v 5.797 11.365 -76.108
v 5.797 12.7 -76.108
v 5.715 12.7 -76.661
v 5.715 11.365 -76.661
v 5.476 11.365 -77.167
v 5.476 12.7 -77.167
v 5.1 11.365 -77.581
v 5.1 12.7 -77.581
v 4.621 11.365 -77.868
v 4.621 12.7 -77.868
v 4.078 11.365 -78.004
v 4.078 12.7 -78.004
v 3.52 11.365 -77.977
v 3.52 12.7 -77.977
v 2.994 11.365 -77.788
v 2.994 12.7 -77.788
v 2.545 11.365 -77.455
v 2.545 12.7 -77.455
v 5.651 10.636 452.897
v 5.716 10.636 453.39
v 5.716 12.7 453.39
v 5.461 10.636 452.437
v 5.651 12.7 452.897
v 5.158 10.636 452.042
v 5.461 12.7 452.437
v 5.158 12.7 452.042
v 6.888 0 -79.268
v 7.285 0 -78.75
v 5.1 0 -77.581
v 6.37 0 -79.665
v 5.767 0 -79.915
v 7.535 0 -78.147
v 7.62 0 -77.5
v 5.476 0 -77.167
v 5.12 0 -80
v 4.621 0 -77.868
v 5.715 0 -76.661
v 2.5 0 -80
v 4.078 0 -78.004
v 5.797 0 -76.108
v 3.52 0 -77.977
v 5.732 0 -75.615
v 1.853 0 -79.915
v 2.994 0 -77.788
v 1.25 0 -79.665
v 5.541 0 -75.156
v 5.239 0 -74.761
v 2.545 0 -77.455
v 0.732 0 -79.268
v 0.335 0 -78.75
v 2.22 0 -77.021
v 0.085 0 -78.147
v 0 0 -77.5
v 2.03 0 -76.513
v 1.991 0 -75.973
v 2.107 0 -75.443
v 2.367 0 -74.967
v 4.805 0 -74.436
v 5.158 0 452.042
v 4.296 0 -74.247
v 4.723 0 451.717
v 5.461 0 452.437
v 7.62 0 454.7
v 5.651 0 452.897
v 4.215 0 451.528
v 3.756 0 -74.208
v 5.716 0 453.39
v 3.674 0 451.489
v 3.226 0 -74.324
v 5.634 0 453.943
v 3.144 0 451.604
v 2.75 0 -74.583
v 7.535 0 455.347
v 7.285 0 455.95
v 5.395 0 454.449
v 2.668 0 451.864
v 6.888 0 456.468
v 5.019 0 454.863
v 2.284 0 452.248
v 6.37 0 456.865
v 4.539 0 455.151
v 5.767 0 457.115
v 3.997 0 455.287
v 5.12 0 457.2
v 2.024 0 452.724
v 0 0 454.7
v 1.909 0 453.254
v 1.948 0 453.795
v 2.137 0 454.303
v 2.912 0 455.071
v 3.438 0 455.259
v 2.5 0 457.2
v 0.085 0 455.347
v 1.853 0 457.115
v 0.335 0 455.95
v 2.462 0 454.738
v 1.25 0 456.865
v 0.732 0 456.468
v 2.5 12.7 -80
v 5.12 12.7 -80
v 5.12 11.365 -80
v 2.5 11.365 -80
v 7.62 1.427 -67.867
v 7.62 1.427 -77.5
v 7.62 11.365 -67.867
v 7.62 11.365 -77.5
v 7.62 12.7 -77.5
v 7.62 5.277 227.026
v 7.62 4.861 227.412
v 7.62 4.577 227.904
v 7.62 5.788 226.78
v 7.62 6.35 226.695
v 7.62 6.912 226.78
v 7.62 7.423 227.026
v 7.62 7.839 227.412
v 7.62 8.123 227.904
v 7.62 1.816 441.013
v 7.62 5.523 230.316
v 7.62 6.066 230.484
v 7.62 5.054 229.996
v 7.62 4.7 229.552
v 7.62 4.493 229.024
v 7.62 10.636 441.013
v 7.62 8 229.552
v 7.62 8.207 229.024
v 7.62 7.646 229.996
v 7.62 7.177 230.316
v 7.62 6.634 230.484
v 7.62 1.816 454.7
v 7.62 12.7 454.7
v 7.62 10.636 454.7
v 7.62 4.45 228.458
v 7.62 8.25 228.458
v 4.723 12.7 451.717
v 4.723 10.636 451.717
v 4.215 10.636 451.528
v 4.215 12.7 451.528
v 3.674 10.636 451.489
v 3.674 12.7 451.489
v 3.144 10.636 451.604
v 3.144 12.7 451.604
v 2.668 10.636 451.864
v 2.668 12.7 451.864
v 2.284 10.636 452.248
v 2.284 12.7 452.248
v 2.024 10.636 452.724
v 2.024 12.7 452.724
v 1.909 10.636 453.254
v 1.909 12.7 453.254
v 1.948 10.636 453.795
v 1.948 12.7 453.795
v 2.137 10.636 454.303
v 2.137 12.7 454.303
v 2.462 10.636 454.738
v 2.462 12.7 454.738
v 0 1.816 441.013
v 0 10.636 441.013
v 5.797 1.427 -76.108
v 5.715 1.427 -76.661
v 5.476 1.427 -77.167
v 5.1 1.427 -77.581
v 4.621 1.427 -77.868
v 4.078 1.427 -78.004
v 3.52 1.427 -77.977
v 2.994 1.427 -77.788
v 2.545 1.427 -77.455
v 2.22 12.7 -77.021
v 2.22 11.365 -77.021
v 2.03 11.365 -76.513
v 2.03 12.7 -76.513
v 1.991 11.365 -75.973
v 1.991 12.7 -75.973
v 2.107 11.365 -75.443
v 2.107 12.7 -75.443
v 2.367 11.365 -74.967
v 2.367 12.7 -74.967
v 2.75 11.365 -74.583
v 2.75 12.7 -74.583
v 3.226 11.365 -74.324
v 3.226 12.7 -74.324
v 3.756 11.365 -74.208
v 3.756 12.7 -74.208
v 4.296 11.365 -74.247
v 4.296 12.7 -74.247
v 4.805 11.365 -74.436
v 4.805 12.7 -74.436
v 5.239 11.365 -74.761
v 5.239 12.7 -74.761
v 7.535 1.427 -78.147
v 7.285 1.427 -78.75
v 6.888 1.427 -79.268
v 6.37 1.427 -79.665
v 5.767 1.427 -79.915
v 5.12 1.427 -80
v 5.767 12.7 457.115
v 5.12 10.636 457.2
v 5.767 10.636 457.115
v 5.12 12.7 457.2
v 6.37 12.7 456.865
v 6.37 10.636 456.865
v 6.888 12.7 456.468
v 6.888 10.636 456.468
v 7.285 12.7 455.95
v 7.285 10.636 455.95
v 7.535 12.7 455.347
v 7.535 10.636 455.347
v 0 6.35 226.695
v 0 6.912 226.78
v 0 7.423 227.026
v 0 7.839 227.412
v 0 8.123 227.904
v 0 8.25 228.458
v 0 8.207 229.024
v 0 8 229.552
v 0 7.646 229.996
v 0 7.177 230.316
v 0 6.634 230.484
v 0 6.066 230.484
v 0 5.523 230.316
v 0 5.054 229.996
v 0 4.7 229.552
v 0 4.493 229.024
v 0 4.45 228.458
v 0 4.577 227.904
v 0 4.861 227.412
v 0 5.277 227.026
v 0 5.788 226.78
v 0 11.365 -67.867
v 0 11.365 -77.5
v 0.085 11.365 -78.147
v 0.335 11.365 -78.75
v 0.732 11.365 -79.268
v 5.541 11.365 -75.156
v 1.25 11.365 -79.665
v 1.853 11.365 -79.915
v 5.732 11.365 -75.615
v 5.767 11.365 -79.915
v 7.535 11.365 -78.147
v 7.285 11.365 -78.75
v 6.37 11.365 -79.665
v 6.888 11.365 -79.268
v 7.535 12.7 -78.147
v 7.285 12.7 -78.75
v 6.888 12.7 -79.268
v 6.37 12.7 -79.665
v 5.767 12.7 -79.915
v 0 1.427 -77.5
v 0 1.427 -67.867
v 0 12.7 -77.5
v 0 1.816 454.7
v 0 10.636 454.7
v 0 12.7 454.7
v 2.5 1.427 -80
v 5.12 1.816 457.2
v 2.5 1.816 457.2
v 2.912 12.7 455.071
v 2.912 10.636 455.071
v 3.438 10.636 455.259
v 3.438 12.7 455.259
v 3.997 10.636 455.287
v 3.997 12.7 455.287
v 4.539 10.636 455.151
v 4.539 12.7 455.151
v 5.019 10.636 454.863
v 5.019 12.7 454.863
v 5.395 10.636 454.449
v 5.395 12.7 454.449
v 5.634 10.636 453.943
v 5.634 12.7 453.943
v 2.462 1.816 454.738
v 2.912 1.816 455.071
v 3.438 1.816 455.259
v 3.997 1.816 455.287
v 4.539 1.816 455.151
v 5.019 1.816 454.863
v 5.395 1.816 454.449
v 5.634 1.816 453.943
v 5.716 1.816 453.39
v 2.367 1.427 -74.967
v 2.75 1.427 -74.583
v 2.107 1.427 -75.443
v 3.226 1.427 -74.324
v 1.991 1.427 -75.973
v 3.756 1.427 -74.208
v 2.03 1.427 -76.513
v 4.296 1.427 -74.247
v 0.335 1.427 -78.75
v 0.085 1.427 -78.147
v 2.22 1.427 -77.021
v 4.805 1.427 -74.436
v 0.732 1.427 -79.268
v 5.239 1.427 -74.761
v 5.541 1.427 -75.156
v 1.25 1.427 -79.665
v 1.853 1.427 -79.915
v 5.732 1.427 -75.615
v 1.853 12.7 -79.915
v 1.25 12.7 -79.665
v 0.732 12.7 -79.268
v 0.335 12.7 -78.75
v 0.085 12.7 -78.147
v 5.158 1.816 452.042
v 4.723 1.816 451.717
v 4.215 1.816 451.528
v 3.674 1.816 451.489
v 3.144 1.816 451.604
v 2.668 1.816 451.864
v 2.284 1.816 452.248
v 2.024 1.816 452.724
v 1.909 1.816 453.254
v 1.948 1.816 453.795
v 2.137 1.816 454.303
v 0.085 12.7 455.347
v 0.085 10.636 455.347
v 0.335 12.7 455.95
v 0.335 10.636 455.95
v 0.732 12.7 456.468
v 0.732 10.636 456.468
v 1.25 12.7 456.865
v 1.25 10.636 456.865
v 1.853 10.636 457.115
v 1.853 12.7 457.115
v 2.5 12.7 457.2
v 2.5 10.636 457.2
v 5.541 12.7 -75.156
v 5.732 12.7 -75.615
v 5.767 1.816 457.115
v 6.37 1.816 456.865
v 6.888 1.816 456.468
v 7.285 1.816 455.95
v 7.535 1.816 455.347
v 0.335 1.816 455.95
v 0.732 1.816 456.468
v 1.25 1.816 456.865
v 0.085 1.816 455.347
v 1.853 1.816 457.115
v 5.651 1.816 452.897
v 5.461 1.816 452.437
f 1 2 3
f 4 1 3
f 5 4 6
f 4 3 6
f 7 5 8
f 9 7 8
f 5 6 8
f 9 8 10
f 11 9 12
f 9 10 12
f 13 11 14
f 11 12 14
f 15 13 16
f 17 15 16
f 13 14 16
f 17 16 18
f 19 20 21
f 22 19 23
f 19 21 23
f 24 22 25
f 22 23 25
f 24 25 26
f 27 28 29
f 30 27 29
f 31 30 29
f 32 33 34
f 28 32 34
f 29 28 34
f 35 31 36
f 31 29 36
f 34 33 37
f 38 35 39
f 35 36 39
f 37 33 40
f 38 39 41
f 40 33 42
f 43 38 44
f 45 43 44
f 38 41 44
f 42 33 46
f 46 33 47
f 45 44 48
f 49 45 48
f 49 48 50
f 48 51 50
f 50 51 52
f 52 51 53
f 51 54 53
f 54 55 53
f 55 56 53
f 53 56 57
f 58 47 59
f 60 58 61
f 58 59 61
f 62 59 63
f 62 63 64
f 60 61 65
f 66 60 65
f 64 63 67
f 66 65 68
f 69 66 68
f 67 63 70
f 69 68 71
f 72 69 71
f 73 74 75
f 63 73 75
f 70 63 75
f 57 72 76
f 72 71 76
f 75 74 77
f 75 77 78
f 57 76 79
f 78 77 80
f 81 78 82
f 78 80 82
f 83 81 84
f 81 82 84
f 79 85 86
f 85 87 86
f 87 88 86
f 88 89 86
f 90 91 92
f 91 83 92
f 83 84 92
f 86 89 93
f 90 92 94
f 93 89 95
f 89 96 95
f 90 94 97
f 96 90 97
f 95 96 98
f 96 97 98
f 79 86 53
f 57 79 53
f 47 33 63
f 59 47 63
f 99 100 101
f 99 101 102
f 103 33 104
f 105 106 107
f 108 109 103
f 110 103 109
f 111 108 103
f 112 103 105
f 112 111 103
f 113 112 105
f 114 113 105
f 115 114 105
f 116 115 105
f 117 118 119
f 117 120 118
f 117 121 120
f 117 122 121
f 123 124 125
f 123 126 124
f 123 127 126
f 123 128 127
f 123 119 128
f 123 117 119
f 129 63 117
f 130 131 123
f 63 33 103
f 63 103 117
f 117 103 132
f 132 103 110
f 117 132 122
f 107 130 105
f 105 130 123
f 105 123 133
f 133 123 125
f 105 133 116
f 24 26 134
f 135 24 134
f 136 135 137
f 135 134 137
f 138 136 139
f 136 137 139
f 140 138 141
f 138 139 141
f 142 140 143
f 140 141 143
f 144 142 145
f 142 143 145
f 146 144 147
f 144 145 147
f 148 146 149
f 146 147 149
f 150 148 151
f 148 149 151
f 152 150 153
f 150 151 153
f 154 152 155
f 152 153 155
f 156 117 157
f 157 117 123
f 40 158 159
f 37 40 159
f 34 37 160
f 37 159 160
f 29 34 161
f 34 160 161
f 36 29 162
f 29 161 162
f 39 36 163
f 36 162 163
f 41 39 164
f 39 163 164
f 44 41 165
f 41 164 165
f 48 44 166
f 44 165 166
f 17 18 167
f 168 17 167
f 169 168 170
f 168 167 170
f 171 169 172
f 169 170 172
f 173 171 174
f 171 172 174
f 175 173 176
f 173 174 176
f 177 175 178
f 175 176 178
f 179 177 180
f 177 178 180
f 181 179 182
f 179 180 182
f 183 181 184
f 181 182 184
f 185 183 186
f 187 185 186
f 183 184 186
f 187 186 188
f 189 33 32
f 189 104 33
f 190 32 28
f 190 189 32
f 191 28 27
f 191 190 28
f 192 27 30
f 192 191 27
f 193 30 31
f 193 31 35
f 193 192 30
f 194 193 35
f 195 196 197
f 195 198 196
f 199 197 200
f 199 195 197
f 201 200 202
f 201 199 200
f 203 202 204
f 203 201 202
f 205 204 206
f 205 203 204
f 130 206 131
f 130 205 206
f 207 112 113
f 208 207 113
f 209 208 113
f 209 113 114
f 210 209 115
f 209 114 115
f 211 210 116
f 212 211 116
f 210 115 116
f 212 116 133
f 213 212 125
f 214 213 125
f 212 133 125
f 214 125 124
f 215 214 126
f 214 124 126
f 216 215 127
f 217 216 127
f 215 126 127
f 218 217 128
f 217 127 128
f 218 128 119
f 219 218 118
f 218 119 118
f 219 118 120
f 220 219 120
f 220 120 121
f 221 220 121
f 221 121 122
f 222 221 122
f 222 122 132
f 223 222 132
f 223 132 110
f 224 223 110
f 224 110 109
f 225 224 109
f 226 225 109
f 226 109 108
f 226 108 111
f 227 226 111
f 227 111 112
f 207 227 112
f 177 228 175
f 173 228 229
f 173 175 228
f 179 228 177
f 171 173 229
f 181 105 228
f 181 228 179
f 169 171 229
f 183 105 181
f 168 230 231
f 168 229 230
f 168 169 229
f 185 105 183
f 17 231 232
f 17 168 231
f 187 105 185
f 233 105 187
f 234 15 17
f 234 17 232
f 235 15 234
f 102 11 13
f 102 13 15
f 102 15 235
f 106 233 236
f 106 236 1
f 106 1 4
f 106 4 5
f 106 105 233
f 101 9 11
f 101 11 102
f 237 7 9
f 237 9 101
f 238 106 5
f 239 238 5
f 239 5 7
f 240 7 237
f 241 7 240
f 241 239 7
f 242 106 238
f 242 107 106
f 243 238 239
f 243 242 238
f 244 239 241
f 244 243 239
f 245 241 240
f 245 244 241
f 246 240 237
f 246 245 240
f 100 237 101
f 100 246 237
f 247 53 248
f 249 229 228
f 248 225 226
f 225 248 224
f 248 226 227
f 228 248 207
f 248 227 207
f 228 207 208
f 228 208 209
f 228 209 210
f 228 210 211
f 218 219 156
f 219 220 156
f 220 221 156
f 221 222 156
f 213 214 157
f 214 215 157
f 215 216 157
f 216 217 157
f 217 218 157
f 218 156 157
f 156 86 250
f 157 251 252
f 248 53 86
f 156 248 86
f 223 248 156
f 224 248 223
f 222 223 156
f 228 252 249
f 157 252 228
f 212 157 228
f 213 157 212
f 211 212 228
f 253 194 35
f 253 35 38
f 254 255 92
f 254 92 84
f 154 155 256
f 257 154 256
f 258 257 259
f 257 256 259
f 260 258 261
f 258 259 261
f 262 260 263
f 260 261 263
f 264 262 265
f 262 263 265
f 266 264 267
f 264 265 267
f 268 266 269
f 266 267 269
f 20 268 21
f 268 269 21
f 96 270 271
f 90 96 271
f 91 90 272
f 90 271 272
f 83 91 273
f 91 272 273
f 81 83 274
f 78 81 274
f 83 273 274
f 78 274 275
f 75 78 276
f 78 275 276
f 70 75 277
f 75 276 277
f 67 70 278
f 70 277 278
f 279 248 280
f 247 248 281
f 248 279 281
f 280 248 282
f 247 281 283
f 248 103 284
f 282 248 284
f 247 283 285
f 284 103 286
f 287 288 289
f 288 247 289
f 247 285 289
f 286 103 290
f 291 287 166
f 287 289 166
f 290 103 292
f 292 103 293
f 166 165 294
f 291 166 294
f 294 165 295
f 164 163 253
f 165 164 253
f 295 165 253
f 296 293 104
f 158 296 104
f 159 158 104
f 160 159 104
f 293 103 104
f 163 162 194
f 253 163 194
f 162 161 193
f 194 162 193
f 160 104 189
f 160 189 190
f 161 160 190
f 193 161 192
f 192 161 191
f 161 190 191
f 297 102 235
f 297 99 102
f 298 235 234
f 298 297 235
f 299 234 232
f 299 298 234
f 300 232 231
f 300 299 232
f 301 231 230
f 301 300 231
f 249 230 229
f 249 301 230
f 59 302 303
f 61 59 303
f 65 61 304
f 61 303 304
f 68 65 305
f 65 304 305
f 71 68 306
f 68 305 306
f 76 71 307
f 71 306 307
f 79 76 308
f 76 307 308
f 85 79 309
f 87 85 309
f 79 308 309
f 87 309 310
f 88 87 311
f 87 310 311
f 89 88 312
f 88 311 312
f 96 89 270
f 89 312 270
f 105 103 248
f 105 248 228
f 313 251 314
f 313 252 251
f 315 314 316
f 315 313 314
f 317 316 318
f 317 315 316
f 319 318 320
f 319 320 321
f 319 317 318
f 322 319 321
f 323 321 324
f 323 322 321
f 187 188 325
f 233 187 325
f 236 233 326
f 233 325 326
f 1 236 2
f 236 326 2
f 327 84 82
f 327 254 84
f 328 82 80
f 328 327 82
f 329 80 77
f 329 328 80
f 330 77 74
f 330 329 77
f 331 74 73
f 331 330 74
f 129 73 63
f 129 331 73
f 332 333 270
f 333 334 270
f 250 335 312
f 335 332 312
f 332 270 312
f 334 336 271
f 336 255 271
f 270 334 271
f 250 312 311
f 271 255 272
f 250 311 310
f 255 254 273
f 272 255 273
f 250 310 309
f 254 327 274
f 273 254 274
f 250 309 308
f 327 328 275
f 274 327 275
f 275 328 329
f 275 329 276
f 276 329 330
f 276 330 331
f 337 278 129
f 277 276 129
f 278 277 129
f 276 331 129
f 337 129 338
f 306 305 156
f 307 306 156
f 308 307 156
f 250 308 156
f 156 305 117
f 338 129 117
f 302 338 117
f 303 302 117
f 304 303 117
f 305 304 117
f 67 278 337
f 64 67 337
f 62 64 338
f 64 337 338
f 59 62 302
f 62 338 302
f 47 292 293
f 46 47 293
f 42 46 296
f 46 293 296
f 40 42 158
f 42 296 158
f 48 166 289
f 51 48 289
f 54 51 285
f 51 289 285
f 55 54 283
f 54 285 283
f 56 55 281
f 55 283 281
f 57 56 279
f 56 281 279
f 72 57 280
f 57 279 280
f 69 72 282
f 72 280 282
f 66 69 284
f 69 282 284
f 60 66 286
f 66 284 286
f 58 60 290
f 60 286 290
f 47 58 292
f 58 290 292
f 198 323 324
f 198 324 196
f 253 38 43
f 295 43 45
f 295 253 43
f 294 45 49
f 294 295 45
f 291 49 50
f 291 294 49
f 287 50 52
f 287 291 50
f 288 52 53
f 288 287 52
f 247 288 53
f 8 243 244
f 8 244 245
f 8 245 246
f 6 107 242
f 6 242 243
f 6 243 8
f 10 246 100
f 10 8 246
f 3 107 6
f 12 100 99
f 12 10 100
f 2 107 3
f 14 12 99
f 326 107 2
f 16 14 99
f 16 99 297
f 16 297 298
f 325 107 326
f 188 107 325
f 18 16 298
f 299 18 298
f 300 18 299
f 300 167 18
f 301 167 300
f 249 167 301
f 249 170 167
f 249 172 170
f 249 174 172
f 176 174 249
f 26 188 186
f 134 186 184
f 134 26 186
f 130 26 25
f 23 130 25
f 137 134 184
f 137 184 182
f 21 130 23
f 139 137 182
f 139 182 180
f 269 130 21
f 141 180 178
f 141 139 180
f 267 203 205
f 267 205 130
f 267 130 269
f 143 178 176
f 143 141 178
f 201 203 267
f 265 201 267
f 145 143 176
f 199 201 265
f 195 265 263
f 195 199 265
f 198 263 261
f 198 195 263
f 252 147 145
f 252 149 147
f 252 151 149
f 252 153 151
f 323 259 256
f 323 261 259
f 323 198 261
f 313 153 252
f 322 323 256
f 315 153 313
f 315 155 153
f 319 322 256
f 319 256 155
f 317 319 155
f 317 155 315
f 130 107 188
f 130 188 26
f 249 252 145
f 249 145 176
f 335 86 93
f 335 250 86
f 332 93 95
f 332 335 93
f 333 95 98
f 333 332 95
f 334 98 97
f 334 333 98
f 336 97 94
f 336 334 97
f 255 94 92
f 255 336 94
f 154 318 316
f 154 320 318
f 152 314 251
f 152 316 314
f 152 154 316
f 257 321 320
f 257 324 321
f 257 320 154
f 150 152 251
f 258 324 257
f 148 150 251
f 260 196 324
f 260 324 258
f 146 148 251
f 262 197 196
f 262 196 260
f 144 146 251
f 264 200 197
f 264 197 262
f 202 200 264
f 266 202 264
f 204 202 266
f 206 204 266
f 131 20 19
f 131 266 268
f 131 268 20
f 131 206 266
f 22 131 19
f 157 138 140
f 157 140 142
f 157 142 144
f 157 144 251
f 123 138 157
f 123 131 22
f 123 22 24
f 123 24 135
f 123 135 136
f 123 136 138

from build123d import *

# Parameters (mm, degrees)
SKETCH1_W           = 7.62
SKETCH1_H           = 12.7
BOSS_EXTRUDE1_DEPTH = 457.2
SKETCH3_R           = 1.905
CUT_EXTRUDE2_DEPTH  = 15
SKETCH4_W           = 16.186958623
SKETCH4_H           = 8.82047947
CUT_EXTRUDE3_DEPTH  = 15
CUT_EXTRUDE4_DEPTH  = 15
FILLET1_R           = 2.5
SKETCH6_W           = 7.62
SKETCH6_H           = 12.7
BOSS_EXTRUDE2_DEPTH = 80
SKETCH7_W           = 12.13309825
SKETCH7_H           = 9.938189712
CUT_EXTRUDE5_DEPTH  = 80
CUT_EXTRUDE6_DEPTH  = 80
FILLET2_R           = 2.5


with BuildPart() as part:
    # Sketch1 → Boss-Extrude1 (new body)
    with BuildSketch(Plane.XY):
        with Locations((3.81, 6.35)):
            Rectangle(SKETCH1_W, SKETCH1_H)
    extrude(amount=BOSS_EXTRUDE1_DEPTH)

    # Sketch3 → Cut-Extrude2 (cut)
    with BuildSketch(Plane(origin=(7.62, 0, 0), x_dir=(0, 0, -1), z_dir=(1, 0, 0))):
        with Locations((-228.6, 6.35)):
            Circle(SKETCH3_R)
    extrude(amount=-CUT_EXTRUDE2_DEPTH, mode=Mode.SUBTRACT)

    # Sketch4 → Cut-Extrude3 (cut)
    with BuildSketch(Plane(origin=(7.62, 0, 0), x_dir=(0, 0, -1), z_dir=(1, 0, 0))):
        with Locations((-449.106520689, 6.226228187)):
            Rectangle(SKETCH4_W, SKETCH4_H)
    extrude(amount=-CUT_EXTRUDE3_DEPTH, mode=Mode.SUBTRACT)

    # Sketch5 → Cut-Extrude4 (cut)
    with BuildSketch(Plane(origin=(0, 12.7, 0), x_dir=(1, 0, 0), z_dir=(0, 1, 0))):
        with BuildLine():
            ThreePointArc((5.157644125, -452.042355875), (2.462355875, -452.042355875), (2.462355875, -454.737644125))
            Line((2.462355875, -454.737644125), (5.157644125, -452.042355875))
        make_face()
        with BuildLine():
            Line((5.157644125, -452.042355875), (2.462355875, -454.737644125))
            ThreePointArc((2.462355875, -454.737644125), (4.539339745, -455.150781904), (5.715856599, -453.39))
            ThreePointArc((5.715856599, -453.39), (5.570781904, -452.660660255), (5.157644125, -452.042355875))
        make_face()
    extrude(amount=-CUT_EXTRUDE4_DEPTH, mode=Mode.SUBTRACT)

    # Fillet1
    fillet1_edges = [part.edges().sort_by_distance(p)[0] for p in [
        (7.62, 0.907994226, 457.2),
        (0, 0.907994226, 457.2),
        (7.62, 11.668233961, 457.2),
        (0, 11.668233961, 457.2),
    ]]
    fillet(fillet1_edges, radius=FILLET1_R)

    # Sketch6 → Boss-Extrude2 (add)
    with BuildSketch(Plane(origin=(0, 0, 0), x_dir=(-1, 0, 0), z_dir=(0, 0, -1))):
        with Locations((-3.81, 6.35)):
            Rectangle(SKETCH6_W, SKETCH6_H)
    extrude(amount=BOSS_EXTRUDE2_DEPTH)

    # Sketch7 → Cut-Extrude5 (cut)
    with BuildSketch(Plane(origin=(7.62, 0, 0), x_dir=(0, 0, -1), z_dir=(1, 0, 0))):
        with Locations((73.933450875, 6.395782886)):
            Rectangle(SKETCH7_W, SKETCH7_H)
    extrude(amount=-CUT_EXTRUDE5_DEPTH, mode=Mode.SUBTRACT)

    # Sketch8 → Cut-Extrude6 (cut)
    with BuildSketch(Plane(origin=(0, 12.7, 0), x_dir=(1, 0, 0), z_dir=(0, 1, 0))):
        with BuildLine():
            ThreePointArc((5.796561175, 76.108438825), (4.620573114, 77.868429334), (2.544522757, 77.455477243))
            Line((2.544522757, 77.455477243), (5.238599594, 74.761400406))
            ThreePointArc((5.238599594, 74.761400406), (5.651551685, 75.379426886), (5.796561175, 76.108438825))
        make_face()
        with BuildLine():
            Line((5.238599594, 74.761400406), (2.544522757, 77.455477243))
            ThreePointArc((2.544522757, 77.455477243), (2.544522757, 74.761400406), (5.238599594, 74.761400406))
        make_face()
    extrude(amount=-CUT_EXTRUDE6_DEPTH, mode=Mode.SUBTRACT)

    # Fillet2
    fillet2_edges = [part.edges().sort_by_distance(p)[0] for p in [
        (0, 0.713344015, -80),
        (7.62, 12.032438871, -80),
        (0, 12.032438871, -80),
        (7.62, 0.713344015, -80),
    ]]
    fillet(fillet2_edges, radius=FILLET2_R)


solid = part.part
